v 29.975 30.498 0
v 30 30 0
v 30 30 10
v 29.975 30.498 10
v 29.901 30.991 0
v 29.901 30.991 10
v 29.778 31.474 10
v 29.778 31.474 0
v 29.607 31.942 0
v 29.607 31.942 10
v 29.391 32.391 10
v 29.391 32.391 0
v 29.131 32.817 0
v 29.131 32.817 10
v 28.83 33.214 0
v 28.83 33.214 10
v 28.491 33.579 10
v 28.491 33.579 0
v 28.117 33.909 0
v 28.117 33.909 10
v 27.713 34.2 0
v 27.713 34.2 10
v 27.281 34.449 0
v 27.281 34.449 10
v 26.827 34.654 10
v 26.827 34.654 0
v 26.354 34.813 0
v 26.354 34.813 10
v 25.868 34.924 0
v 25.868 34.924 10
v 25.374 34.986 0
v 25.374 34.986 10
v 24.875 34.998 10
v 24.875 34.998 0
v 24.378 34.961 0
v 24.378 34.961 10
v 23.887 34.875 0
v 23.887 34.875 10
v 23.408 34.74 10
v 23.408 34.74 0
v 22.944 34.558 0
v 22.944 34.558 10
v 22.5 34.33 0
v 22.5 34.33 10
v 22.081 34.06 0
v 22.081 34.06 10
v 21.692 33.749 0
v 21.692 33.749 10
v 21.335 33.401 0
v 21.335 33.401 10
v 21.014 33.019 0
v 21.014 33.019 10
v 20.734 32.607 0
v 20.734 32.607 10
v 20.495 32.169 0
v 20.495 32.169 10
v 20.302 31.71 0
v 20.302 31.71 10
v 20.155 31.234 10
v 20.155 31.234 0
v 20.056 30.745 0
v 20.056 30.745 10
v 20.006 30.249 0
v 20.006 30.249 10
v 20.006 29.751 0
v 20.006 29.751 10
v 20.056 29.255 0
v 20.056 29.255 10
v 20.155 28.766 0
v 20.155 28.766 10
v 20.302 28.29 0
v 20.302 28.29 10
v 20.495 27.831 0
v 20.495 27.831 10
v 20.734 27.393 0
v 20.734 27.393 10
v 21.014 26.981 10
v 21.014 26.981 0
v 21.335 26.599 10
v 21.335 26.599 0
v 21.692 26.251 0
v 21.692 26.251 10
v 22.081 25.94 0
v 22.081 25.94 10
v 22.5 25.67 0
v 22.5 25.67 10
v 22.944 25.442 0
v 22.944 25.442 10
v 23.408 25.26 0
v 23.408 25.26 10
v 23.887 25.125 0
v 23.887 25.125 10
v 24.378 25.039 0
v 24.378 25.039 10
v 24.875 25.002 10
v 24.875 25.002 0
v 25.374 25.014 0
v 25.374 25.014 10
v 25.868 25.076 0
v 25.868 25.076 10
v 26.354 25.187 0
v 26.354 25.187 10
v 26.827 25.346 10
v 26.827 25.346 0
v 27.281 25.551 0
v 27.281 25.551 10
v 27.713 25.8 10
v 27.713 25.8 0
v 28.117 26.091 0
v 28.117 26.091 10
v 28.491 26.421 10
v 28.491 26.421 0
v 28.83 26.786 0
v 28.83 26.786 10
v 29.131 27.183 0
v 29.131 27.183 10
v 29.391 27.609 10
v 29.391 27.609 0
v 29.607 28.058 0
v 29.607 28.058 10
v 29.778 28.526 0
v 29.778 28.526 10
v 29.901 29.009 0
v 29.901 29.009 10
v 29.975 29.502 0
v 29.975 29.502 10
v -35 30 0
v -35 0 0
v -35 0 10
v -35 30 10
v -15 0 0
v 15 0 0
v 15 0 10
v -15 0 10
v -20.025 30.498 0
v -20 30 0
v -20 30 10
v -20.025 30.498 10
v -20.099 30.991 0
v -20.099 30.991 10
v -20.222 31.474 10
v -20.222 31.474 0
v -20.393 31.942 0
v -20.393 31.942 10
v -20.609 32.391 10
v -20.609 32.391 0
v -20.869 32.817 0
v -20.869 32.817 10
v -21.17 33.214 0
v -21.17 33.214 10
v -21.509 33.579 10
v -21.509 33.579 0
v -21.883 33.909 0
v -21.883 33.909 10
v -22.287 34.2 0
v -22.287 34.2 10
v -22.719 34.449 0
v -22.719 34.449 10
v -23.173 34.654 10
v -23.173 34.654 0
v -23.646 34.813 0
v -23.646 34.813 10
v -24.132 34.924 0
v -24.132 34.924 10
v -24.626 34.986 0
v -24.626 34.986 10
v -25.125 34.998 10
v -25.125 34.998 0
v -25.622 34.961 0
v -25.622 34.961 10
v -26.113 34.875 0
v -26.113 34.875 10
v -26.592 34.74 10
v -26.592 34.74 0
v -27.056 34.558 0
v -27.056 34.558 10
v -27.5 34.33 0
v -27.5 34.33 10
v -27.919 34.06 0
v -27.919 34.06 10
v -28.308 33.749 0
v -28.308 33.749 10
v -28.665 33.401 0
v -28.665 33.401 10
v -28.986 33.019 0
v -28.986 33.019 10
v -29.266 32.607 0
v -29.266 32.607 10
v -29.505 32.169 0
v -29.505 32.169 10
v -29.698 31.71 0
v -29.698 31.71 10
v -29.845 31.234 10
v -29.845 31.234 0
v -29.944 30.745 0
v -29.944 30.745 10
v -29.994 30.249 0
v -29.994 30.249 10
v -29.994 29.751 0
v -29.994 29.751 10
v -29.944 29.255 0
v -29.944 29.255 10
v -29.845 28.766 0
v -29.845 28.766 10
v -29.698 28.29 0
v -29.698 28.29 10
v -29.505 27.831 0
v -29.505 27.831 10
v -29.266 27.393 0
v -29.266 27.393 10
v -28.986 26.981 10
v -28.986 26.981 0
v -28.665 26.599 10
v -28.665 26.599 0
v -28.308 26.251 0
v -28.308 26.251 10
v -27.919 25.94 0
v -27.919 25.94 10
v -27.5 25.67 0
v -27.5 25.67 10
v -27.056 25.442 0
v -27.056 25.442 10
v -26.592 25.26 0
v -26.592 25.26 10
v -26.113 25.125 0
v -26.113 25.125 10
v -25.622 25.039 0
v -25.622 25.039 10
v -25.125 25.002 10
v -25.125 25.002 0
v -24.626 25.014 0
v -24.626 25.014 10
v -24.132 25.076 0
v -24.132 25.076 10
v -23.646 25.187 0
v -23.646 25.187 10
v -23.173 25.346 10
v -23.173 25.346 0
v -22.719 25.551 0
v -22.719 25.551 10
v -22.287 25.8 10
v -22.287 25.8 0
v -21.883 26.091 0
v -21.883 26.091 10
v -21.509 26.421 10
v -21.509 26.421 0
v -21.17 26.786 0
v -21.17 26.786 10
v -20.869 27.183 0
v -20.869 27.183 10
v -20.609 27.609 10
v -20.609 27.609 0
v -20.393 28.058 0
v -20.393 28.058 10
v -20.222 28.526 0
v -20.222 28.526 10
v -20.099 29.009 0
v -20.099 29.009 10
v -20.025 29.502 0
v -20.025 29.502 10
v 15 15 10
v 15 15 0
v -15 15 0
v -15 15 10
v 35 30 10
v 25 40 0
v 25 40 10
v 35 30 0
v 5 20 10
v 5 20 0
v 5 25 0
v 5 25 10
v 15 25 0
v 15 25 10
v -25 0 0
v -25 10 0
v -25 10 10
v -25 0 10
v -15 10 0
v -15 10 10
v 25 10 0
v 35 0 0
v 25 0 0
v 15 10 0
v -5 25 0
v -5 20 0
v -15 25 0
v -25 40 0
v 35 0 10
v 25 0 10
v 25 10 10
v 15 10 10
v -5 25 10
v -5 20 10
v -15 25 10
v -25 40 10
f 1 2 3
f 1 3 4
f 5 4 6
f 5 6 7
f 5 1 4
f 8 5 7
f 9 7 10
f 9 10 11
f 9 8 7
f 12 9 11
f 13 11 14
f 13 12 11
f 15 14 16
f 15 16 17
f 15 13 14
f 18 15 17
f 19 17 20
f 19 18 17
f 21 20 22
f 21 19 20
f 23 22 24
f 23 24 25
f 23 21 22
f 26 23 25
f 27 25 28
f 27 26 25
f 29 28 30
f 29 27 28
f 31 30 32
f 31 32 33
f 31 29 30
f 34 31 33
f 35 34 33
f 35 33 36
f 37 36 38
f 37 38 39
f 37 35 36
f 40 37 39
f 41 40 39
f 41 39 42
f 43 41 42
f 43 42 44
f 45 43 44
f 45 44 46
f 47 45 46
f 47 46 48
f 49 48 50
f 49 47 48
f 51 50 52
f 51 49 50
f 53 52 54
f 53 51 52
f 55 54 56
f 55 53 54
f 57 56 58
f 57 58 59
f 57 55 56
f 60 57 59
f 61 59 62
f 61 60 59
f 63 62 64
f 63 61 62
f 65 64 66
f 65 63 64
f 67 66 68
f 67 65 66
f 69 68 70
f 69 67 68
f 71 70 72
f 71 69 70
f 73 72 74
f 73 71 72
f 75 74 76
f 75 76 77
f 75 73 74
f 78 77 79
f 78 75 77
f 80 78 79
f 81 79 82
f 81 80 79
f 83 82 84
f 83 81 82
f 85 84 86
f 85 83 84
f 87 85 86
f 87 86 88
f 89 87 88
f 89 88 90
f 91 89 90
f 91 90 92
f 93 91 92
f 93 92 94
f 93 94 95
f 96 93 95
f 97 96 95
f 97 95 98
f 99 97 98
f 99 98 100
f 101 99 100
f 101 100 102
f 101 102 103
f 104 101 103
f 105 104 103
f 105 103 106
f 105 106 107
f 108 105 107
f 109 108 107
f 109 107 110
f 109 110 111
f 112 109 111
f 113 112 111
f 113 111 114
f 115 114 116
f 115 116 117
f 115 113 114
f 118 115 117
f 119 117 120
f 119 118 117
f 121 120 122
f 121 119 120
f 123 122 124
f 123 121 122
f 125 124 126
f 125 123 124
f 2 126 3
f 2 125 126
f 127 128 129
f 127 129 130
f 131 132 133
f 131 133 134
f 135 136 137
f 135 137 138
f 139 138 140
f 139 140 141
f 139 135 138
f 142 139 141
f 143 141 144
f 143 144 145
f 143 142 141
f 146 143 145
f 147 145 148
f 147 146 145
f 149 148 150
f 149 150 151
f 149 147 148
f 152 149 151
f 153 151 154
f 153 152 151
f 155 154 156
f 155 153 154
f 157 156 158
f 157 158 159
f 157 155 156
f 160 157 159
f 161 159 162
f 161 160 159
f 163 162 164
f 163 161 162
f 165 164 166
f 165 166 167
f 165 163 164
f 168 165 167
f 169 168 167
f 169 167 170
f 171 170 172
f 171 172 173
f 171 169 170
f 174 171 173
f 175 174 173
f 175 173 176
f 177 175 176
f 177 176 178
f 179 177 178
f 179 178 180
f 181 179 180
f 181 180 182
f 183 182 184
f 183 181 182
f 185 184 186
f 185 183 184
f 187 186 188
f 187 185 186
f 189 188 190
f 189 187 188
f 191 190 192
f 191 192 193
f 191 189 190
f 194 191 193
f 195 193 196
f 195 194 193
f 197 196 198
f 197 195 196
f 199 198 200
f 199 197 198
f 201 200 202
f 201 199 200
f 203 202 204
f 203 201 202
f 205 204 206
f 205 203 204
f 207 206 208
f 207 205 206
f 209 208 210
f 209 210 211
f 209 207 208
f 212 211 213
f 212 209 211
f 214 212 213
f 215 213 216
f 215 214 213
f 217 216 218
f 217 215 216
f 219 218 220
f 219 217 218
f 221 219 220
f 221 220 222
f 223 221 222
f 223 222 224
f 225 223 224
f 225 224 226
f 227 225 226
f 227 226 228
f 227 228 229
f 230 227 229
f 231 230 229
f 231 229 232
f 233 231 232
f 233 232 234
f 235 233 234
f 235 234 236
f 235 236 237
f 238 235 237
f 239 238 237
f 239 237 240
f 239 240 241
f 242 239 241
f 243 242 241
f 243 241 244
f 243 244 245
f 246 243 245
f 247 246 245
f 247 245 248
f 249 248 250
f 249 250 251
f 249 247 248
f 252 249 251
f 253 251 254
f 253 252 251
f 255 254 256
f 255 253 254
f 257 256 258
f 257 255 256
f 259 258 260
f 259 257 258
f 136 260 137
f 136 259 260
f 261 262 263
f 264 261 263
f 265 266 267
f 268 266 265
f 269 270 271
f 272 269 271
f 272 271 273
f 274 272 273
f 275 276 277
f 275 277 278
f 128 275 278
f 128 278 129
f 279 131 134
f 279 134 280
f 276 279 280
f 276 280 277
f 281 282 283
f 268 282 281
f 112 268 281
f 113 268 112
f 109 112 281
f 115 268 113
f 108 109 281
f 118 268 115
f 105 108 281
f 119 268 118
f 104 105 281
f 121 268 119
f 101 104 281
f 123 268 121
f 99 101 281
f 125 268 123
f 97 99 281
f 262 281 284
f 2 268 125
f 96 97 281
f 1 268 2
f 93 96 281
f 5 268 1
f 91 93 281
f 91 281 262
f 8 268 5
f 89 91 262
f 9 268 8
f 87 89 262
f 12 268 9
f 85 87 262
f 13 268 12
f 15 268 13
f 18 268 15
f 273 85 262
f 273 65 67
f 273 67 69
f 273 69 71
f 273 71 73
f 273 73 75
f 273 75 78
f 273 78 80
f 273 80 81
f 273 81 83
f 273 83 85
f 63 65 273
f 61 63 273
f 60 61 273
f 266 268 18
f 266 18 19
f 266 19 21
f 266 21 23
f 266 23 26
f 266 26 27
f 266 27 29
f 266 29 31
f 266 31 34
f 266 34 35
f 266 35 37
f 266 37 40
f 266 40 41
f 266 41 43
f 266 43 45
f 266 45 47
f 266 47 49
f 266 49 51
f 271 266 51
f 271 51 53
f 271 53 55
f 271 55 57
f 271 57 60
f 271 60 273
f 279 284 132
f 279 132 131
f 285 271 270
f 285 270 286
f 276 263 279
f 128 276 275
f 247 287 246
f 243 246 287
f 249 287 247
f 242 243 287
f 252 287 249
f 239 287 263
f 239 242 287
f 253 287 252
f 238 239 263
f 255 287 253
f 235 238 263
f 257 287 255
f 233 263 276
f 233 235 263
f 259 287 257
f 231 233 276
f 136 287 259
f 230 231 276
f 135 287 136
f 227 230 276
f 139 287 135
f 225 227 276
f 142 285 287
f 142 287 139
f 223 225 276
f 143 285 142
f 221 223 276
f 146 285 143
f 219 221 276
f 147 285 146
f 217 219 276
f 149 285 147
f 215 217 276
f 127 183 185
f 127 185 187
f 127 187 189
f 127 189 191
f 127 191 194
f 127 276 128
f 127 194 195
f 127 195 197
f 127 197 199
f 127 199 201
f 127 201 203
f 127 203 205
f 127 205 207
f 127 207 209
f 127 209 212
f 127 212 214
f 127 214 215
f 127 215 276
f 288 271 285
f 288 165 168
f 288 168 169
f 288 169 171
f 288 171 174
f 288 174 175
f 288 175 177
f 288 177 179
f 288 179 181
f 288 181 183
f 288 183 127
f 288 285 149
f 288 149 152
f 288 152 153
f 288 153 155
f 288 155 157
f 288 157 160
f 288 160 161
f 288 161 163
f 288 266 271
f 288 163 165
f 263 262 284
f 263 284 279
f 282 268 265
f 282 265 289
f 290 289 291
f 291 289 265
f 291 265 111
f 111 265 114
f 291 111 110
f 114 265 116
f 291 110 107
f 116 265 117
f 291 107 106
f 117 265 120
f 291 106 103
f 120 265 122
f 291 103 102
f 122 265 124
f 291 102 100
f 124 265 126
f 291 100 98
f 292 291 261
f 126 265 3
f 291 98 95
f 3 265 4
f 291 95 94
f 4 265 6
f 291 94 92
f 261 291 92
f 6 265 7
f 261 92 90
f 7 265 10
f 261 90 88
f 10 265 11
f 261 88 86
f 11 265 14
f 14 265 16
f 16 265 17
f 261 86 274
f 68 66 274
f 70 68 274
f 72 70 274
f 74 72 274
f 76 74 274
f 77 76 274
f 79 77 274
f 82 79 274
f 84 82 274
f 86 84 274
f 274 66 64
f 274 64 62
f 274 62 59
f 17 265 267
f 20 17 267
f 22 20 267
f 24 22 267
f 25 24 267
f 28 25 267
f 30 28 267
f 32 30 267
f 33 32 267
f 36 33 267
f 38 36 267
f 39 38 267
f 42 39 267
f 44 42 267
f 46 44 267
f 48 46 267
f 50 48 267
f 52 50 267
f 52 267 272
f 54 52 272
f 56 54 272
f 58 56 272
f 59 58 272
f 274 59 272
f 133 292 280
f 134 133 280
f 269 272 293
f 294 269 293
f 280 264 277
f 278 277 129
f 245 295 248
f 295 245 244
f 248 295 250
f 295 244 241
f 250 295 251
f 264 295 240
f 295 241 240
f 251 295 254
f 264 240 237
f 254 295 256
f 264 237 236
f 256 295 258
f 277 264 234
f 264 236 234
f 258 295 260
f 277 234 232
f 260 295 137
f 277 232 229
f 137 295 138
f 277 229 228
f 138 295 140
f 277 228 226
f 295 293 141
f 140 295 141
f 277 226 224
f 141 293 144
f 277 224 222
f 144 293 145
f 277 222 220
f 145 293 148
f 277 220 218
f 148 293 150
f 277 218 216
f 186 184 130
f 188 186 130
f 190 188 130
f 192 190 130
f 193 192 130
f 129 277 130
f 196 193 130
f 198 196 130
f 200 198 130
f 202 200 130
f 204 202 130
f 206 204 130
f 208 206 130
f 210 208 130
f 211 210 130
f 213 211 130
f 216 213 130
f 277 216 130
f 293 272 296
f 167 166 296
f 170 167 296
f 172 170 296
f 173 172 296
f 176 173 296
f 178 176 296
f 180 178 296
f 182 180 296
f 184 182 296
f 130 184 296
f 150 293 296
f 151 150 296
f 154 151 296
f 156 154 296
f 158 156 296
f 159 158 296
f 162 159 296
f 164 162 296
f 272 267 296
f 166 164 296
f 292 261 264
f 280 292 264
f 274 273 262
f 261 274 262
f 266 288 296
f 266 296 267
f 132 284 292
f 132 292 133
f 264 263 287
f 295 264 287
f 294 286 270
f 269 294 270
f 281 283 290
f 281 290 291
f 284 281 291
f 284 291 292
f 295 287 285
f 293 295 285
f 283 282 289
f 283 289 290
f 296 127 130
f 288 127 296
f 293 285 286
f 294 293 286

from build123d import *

# Parameters (mm, degrees)
SKETCH1_R           = 5
BOSS_EXTRUDE1_DEPTH = 10


with BuildPart() as part:
    # Sketch1 → Boss-Extrude1 (new body)
    with BuildSketch(Plane.XY):
        Polygon((-35, 30), (-25, 40), (25, 40), (35, 30), (35, 0), (25, 0), (25, 10), (15, 10), (15, 0), (-15, 0), (-15, 10), (-25, 10), (-25, 0), (-35, 0), align=None)
        with Locations((-25, 30)):
            Circle(SKETCH1_R, mode=Mode.SUBTRACT)
        with Locations((25, 30)):
            Circle(SKETCH1_R, mode=Mode.SUBTRACT)
        Polygon((15, 15), (-15, 15), (-15, 25), (-5, 25), (-5, 20), (5, 20), (5, 25), (15, 25), align=None, mode=Mode.SUBTRACT)
    extrude(amount=BOSS_EXTRUDE1_DEPTH)


solid = part.part
